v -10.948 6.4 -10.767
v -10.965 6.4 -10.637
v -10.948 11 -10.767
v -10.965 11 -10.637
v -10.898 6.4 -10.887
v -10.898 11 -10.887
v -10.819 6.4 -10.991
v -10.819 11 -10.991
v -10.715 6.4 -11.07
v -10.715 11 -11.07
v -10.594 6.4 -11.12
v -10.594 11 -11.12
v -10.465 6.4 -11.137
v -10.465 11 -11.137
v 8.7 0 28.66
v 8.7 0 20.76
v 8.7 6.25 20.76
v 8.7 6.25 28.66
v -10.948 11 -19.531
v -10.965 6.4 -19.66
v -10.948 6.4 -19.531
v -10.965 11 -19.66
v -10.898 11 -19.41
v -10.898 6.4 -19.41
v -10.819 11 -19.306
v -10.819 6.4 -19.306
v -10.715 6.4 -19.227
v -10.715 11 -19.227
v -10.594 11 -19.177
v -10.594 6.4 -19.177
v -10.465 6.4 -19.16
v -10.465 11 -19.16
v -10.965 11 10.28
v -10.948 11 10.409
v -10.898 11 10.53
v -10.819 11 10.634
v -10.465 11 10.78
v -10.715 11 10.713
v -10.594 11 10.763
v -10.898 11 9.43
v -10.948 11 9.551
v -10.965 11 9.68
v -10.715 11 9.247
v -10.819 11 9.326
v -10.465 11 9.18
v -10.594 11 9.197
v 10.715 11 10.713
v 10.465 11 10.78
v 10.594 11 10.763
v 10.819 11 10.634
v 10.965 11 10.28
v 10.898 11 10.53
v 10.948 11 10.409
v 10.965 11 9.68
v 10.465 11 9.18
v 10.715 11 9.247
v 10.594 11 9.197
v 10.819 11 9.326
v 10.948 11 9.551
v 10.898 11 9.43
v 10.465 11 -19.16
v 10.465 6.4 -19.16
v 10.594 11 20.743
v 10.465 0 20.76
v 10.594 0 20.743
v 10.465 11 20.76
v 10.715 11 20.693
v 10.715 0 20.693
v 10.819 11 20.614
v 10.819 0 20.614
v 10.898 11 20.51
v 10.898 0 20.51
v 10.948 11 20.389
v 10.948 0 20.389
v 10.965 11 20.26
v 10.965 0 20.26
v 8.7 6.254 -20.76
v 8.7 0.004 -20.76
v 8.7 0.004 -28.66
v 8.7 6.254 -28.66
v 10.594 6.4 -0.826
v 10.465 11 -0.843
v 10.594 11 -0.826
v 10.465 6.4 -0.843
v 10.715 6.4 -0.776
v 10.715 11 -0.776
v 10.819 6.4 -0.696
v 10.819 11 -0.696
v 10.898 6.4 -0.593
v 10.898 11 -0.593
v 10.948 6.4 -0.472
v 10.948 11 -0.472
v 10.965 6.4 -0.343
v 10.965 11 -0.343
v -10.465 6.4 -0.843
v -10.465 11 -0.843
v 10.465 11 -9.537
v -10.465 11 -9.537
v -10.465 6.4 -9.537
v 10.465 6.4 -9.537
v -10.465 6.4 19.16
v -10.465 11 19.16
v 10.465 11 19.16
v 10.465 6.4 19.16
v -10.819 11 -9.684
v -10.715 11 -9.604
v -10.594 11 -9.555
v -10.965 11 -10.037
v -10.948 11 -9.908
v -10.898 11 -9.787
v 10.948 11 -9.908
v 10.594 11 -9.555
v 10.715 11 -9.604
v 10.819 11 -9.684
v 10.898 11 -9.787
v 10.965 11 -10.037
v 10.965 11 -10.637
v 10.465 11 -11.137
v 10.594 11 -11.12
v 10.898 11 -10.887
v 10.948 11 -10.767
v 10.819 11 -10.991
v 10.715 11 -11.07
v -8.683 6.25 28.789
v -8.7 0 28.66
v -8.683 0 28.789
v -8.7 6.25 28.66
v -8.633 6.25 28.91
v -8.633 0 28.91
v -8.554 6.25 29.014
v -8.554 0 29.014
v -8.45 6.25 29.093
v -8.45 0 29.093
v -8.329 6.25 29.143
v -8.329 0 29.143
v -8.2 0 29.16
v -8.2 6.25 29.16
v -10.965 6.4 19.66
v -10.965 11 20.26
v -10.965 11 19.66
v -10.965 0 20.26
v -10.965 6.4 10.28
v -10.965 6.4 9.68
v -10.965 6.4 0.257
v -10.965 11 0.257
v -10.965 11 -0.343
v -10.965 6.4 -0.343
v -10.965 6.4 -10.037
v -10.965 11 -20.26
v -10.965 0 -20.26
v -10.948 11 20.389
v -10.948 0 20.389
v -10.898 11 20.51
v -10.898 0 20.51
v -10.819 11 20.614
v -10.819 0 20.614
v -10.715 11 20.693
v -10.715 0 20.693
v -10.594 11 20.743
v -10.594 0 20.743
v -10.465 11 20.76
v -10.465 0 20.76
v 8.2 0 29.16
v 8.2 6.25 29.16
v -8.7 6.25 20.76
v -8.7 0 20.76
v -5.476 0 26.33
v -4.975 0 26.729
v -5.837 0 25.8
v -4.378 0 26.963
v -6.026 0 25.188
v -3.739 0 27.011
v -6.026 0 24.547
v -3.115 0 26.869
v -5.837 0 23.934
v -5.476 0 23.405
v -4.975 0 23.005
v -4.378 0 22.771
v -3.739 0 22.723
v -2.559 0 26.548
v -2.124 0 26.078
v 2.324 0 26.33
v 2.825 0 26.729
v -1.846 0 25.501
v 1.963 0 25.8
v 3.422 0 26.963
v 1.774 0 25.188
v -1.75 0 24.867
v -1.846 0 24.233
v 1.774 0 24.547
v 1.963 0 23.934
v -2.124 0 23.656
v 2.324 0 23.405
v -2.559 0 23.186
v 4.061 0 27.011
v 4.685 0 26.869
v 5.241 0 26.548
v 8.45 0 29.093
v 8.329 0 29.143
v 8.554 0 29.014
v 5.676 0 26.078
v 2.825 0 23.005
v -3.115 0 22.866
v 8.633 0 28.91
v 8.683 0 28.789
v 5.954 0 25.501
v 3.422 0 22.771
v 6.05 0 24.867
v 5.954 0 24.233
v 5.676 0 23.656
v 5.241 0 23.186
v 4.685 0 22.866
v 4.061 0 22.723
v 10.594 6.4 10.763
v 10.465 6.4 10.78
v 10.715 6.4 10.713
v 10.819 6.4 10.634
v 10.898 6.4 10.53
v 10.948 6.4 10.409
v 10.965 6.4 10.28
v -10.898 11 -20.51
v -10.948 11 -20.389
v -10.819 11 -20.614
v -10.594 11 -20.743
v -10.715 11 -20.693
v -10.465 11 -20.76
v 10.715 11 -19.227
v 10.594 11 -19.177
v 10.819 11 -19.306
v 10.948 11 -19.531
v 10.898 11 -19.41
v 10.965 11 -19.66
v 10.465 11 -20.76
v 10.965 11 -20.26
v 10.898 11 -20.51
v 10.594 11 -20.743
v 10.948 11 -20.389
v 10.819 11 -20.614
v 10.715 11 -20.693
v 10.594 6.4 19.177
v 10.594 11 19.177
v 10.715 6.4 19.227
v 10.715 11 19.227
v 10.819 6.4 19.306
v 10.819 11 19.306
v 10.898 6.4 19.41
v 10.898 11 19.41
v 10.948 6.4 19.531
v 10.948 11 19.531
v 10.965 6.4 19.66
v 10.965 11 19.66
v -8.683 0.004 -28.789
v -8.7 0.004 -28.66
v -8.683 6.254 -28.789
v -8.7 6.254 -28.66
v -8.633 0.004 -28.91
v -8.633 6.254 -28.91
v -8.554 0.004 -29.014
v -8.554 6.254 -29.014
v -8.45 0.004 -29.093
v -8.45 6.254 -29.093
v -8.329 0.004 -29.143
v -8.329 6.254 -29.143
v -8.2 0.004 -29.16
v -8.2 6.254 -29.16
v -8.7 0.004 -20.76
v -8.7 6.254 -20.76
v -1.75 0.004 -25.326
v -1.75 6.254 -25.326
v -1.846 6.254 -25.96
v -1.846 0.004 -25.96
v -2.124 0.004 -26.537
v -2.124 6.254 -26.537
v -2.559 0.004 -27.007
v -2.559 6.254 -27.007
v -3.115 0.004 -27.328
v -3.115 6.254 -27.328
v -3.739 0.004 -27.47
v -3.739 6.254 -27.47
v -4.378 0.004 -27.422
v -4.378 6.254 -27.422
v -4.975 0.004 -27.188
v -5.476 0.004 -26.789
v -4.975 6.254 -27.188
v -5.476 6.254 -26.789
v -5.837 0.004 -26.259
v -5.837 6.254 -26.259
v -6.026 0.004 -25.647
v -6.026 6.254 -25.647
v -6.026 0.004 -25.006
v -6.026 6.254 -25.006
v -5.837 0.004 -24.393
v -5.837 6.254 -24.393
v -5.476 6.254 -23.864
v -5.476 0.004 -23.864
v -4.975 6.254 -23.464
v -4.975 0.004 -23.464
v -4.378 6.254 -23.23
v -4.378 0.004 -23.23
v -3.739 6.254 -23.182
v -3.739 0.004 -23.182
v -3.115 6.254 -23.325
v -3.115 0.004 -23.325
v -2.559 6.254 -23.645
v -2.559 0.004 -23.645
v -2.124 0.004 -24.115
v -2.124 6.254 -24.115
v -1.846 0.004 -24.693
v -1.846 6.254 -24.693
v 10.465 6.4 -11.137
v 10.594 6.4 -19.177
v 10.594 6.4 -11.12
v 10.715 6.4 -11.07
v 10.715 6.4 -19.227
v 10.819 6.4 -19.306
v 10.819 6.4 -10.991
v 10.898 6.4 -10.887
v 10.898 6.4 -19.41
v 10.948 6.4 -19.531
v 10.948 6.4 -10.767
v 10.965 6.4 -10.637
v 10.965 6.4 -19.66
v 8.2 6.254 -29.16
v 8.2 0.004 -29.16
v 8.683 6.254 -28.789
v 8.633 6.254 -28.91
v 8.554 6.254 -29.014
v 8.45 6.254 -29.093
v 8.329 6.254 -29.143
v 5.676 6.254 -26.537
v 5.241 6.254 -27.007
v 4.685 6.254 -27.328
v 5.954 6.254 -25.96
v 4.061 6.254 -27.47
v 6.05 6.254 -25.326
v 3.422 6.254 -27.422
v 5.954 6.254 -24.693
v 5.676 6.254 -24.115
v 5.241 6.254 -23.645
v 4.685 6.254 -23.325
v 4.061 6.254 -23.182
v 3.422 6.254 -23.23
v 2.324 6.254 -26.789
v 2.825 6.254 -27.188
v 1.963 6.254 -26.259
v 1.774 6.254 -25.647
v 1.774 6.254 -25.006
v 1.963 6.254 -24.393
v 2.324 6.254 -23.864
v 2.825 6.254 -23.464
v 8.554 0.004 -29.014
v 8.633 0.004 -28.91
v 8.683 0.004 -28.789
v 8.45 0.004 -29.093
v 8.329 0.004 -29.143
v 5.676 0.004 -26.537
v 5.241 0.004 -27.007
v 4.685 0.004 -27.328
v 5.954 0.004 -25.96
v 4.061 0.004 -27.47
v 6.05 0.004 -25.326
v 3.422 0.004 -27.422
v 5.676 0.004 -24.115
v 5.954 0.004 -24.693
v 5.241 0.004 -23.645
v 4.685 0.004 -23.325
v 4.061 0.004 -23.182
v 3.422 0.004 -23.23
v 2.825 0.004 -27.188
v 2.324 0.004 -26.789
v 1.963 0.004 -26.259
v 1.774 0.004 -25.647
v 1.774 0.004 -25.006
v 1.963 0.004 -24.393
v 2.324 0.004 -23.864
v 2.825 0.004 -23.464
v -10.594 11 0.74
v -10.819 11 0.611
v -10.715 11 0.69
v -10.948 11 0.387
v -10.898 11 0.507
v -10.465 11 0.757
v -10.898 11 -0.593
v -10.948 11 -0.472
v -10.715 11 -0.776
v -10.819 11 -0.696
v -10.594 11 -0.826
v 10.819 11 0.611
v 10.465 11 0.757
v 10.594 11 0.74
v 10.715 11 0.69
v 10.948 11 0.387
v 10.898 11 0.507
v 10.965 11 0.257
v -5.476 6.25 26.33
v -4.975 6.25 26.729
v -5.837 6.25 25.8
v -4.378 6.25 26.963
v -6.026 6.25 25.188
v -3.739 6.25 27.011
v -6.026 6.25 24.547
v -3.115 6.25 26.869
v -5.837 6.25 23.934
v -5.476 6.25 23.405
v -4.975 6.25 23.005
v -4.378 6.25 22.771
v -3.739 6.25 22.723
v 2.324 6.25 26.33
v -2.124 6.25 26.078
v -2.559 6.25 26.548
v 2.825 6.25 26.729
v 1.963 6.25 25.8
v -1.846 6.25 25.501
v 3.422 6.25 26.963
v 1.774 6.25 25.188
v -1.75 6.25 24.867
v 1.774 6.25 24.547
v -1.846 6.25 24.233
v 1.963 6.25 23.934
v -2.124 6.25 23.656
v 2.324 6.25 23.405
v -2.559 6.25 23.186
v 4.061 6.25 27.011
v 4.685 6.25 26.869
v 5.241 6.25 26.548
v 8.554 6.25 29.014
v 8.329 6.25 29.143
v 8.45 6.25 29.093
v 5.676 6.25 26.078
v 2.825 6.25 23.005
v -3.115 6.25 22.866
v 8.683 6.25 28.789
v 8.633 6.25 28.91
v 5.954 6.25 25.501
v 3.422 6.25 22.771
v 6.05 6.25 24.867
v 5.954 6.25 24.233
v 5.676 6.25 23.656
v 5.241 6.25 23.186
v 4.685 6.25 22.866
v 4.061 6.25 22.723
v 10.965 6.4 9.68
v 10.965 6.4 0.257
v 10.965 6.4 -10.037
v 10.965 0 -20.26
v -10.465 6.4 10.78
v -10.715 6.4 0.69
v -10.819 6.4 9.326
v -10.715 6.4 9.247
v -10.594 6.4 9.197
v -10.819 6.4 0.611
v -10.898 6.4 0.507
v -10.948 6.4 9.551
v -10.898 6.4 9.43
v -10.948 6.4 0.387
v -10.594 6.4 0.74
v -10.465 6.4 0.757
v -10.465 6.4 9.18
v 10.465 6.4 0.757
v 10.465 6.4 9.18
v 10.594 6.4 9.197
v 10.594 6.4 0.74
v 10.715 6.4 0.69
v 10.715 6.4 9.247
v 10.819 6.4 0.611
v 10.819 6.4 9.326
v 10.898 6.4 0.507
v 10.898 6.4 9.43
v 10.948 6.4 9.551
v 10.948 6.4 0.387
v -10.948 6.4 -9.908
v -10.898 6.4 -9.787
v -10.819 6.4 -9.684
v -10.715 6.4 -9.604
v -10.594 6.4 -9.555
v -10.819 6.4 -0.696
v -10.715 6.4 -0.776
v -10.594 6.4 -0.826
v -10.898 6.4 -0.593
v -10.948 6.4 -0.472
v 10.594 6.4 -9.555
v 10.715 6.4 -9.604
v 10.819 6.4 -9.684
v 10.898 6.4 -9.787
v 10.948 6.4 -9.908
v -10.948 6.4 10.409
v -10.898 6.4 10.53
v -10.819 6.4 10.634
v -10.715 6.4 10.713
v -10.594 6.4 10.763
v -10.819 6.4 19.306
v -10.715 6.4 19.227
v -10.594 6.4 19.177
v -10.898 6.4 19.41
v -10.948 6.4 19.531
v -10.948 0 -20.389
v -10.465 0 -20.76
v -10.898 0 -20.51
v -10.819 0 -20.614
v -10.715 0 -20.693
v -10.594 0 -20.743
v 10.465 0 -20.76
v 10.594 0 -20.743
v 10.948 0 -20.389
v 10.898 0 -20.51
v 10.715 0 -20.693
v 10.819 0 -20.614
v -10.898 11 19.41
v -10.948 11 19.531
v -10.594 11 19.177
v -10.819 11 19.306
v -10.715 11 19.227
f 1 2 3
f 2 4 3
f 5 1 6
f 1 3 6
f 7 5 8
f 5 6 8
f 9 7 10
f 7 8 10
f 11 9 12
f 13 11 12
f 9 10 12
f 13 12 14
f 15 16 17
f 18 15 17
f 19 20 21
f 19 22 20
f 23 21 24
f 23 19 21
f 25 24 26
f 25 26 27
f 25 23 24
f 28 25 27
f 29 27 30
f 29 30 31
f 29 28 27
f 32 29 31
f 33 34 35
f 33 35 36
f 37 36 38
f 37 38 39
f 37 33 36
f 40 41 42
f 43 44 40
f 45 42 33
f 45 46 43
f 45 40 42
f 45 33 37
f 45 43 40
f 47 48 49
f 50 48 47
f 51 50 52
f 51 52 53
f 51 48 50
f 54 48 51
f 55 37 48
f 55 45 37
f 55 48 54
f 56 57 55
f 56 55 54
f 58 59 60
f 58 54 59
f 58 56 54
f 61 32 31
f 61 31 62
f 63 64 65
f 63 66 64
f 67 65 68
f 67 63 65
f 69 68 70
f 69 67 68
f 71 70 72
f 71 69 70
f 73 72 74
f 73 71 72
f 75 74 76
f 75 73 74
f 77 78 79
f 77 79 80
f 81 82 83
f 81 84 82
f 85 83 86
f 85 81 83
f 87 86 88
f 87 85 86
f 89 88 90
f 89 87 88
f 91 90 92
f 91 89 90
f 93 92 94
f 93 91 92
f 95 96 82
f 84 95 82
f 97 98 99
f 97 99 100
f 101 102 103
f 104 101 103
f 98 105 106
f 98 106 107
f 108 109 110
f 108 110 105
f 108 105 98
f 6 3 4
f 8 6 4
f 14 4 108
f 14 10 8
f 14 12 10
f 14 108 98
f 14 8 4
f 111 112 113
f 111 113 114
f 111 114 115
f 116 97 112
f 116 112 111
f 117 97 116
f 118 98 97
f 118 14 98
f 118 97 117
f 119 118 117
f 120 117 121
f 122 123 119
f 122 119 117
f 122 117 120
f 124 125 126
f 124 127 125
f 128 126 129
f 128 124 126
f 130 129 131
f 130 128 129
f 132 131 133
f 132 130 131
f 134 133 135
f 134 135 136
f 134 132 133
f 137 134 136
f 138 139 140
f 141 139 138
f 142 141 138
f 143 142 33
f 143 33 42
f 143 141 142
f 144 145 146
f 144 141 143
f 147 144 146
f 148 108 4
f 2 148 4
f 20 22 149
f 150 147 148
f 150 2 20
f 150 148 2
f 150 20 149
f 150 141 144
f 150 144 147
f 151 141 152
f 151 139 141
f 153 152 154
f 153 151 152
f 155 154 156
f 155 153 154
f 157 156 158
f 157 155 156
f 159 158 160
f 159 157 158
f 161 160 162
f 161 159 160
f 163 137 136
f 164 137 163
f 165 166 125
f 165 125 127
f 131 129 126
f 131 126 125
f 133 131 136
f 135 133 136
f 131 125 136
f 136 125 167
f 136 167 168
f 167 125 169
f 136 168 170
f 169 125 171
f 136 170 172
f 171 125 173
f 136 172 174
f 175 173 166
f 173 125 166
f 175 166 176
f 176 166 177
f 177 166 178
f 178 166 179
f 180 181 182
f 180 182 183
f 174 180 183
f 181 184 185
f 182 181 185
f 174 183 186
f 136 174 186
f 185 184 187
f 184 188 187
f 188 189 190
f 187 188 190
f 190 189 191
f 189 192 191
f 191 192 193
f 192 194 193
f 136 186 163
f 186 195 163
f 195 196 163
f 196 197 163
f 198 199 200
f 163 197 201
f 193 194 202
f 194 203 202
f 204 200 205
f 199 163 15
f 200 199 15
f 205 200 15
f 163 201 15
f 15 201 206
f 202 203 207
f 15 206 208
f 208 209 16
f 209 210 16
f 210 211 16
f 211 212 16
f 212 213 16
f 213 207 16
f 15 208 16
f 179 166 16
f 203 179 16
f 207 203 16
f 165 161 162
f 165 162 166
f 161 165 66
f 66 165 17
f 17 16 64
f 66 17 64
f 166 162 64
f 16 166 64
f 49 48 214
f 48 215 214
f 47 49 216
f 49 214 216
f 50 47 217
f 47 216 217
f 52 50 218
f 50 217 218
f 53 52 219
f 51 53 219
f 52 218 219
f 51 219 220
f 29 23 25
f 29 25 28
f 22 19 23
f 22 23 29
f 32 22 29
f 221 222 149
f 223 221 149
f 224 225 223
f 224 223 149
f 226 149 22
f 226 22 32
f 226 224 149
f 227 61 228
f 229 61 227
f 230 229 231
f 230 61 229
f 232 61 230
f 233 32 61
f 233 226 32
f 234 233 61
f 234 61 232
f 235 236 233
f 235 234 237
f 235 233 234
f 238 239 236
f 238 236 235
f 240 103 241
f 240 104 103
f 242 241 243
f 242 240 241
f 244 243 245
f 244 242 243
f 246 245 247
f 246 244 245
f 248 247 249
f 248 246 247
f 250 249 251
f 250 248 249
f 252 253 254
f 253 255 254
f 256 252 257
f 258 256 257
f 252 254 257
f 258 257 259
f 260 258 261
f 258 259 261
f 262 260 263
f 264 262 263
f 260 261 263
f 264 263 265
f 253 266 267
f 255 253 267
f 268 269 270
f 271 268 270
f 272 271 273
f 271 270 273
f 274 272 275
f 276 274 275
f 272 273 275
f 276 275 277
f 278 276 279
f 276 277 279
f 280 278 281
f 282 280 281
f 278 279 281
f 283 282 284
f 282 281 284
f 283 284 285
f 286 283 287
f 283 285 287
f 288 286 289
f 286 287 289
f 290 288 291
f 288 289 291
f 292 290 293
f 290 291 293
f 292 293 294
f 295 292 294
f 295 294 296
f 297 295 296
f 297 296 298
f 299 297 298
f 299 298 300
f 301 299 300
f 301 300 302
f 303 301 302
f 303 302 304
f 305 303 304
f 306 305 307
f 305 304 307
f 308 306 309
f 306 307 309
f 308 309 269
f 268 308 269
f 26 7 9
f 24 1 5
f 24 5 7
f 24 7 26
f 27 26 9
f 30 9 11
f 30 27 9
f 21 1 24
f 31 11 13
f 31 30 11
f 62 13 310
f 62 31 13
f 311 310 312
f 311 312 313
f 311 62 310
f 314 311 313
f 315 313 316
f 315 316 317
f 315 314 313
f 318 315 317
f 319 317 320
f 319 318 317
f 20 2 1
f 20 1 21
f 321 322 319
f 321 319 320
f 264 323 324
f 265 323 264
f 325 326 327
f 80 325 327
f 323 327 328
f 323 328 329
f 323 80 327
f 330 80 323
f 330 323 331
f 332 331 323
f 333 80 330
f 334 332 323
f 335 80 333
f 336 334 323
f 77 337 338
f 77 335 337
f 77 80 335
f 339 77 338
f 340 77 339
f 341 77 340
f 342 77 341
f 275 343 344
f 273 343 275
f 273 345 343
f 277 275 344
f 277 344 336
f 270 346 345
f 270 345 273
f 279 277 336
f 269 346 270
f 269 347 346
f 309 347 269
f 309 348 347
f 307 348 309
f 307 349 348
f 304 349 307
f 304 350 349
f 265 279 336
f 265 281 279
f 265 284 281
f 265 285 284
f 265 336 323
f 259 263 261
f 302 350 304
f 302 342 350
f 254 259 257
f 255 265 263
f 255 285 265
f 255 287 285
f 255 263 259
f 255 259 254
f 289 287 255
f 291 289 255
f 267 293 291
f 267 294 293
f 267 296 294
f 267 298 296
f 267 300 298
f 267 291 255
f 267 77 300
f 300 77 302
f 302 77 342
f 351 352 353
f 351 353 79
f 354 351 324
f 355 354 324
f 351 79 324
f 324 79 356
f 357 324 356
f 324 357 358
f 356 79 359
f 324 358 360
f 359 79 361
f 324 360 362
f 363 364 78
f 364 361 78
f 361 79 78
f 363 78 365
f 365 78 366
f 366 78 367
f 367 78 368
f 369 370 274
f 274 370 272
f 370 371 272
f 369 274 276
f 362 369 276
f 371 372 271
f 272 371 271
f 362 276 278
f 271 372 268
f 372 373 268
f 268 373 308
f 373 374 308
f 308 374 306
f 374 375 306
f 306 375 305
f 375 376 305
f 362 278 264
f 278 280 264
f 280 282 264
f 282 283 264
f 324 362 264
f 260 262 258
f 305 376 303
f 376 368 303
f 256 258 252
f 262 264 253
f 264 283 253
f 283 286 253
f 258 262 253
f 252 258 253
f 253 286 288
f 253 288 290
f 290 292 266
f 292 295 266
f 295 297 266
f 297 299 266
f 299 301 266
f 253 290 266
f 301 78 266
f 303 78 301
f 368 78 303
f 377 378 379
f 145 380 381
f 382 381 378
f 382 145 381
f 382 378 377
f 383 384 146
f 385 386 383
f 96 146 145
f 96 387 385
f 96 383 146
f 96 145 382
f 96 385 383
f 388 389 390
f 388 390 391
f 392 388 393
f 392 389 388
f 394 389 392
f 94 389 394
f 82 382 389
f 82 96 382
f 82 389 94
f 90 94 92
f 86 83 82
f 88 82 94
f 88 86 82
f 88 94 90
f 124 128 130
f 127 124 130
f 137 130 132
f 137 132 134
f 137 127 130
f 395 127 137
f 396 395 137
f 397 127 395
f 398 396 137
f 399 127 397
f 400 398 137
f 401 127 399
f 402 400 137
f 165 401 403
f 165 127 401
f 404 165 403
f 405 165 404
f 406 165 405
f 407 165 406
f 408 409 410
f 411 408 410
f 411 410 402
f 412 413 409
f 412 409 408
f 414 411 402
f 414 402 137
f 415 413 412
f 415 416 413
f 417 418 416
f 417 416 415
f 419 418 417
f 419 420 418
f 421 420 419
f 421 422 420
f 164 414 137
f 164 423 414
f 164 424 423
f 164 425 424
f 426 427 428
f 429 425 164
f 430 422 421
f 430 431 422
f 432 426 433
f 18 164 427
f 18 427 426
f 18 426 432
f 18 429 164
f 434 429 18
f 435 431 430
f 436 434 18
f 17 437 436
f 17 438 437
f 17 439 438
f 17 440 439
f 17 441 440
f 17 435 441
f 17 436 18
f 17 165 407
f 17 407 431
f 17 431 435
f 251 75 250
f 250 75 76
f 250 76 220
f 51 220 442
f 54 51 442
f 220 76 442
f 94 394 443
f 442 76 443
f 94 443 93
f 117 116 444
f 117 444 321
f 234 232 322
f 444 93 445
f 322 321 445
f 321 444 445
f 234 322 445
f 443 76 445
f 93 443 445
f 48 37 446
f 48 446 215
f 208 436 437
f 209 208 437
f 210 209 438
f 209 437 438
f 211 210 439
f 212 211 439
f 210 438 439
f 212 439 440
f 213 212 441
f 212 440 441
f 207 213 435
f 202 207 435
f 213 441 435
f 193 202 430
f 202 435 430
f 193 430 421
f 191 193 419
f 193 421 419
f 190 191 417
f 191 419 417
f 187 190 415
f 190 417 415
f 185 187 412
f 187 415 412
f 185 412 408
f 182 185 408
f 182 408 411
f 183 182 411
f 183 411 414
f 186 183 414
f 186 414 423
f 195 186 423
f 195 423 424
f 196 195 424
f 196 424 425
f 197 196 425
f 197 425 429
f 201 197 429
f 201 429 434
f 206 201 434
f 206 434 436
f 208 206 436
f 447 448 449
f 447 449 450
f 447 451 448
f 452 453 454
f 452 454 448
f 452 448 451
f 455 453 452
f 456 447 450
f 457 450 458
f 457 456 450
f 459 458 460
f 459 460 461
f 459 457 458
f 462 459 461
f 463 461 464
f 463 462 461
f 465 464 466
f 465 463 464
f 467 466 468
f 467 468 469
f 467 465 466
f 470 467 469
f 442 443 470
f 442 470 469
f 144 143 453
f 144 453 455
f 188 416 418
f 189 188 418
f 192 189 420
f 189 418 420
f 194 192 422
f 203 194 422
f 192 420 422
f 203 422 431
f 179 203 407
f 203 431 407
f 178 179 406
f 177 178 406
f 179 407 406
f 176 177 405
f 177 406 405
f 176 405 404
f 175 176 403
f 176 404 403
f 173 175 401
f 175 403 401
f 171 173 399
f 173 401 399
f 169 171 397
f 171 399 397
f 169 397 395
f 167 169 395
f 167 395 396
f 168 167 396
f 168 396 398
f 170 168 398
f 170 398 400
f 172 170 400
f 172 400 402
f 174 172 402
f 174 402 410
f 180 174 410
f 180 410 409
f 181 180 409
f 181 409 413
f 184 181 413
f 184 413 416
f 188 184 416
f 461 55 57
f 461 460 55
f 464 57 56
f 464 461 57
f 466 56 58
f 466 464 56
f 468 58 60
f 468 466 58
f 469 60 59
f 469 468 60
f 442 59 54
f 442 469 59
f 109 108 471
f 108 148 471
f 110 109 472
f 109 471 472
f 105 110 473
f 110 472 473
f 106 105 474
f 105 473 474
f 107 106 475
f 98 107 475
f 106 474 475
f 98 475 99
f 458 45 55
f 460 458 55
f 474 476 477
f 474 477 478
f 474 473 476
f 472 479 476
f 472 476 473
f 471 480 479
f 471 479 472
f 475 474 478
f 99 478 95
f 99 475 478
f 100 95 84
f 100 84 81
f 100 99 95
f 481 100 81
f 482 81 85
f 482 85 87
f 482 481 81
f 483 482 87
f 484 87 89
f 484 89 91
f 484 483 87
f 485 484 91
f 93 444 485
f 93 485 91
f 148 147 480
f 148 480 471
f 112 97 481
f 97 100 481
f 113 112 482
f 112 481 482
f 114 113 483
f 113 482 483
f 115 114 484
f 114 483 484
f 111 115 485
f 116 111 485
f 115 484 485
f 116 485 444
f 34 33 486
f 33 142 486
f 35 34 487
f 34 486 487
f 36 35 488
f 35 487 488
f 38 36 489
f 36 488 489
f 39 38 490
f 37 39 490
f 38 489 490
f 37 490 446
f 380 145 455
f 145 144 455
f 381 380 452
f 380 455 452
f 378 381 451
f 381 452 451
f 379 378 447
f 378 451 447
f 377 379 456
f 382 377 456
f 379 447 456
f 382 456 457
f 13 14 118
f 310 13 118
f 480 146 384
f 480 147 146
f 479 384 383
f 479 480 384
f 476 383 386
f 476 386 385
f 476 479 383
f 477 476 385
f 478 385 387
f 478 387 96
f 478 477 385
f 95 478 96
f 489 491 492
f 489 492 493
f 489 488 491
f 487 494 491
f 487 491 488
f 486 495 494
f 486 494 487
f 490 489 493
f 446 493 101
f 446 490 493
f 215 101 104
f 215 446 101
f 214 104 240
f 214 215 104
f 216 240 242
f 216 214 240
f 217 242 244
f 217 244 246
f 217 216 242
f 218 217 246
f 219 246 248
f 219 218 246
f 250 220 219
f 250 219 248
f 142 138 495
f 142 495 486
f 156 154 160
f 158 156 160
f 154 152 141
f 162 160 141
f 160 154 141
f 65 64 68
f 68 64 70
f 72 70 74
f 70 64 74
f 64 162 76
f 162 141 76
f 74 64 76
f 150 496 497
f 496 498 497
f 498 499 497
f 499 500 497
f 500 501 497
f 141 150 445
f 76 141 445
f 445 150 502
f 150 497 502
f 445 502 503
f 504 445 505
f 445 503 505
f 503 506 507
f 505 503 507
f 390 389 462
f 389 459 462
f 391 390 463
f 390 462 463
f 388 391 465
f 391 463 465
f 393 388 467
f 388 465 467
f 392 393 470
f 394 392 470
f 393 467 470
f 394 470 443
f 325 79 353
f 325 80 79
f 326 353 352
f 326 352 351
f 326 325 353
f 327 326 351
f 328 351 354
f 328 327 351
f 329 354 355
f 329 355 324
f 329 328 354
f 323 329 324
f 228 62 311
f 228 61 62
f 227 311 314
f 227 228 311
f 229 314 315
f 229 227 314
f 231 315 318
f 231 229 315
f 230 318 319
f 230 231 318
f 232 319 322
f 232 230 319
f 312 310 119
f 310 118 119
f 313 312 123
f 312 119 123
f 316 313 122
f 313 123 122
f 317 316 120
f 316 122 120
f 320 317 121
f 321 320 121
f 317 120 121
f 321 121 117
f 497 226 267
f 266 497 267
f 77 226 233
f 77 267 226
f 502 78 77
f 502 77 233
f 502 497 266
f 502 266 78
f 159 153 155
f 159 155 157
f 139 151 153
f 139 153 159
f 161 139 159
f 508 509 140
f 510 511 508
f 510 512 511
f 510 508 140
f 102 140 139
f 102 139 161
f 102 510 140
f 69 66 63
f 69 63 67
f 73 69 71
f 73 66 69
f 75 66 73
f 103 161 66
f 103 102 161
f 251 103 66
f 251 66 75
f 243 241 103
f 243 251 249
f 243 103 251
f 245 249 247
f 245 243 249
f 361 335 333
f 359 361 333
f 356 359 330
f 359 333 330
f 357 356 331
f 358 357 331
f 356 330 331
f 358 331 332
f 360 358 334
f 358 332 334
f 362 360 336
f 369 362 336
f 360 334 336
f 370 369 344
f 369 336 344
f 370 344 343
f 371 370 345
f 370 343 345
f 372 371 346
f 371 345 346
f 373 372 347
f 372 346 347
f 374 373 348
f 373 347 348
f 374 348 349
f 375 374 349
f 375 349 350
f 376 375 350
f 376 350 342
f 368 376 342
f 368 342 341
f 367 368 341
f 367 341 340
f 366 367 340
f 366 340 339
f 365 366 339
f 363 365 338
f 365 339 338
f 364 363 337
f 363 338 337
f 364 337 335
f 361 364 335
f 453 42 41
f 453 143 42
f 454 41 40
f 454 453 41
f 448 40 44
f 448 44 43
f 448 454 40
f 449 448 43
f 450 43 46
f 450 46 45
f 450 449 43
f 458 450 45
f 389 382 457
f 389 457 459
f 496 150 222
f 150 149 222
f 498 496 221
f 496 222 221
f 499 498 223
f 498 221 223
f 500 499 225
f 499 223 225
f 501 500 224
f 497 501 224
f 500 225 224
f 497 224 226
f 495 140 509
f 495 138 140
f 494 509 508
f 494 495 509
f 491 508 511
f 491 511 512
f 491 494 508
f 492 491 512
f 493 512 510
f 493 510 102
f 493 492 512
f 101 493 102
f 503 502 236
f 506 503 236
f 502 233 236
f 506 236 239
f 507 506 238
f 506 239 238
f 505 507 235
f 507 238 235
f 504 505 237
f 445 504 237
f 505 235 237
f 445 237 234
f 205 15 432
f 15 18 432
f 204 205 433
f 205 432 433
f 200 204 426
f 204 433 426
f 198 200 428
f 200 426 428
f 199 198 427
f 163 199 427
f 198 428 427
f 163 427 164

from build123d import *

# Parameters (mm, degrees)
SKETCH1_W           = 21.93
SKETCH1_H           = 41.52
BOSS_EXTRUDE2_DEPTH = 11
SKETCH3_W           = 21.93
SKETCH3_H           = 8.38
SKETCH3_H_2         = 8.42274565
SKETCH3_H_3         = 8.694734819
SKETCH3_W_2         = 22
SKETCH3_H_4         = 8.022519531
CUT_EXTRUDE2_DEPTH  = 4.6
BOSS_EXTRUDE3_START = 20.76
SKETCH5_W           = 17.4
SKETCH5_H           = 6.25
BOSS_EXTRUDE3_DEPTH = 8.4
SKETCH6_R           = 2.15
CUT_EXTRUDE3_DEPTH  = 8.4
SKETCH7_W           = 17.4
SKETCH7_H           = 6.25
BOSS_EXTRUDE4_DEPTH = 8.4
SKETCH9_R           = 2.15
CUT_EXTRUDE4_DEPTH  = 6.25
FILLET2_R           = 0.5


with BuildPart() as part:
    # Sketch1 → Boss-Extrude2 (new body)
    with BuildSketch(Plane(origin=(0, 0, 0), x_dir=(1, 0, 0), z_dir=(0, 1, 0))):
        Rectangle(SKETCH1_W, SKETCH1_H)
    extrude(amount=BOSS_EXTRUDE2_DEPTH)

    # Sketch3 → Cut-Extrude2 (cut)
    with BuildSketch(Plane(origin=(0, 11, 0), x_dir=(1, 0, 0), z_dir=(0, 1, 0))):
        with Locations((0, -14.97)):
            Rectangle(SKETCH3_W, SKETCH3_H)
        with Locations((0, -4.968627175)):
            Rectangle(SKETCH3_W, SKETCH3_H_2)
        with Locations((0, 5.190113059)):
            Rectangle(SKETCH3_W, SKETCH3_H_3)
        with Locations((0.013958332, 15.148740234)):
            Rectangle(SKETCH3_W_2, SKETCH3_H_4)
    extrude(amount=-CUT_EXTRUDE2_DEPTH, mode=Mode.SUBTRACT)

    # Sketch5 → Boss-Extrude3 (add)
    with BuildSketch(Plane.XY.offset(BOSS_EXTRUDE3_START)):
        with Locations((0, 3.125184184)):
            Rectangle(SKETCH5_W, SKETCH5_H)
    extrude(amount=BOSS_EXTRUDE3_DEPTH)

    # Sketch6 → Cut-Extrude3 (cut)
    with BuildSketch(Plane(origin=(0, 6.250184184, 0), x_dir=(1, 0, 0), z_dir=(0, 1, 0))):
        with Locations((-3.9, -24.867133618)):
            Circle(SKETCH6_R)
        with Locations((3.9, -24.867133618)):
            Circle(SKETCH6_R)
    extrude(amount=-CUT_EXTRUDE3_DEPTH, mode=Mode.SUBTRACT)

    # Sketch7 → Boss-Extrude4 (add)
    with BuildSketch(Plane(origin=(0, 0, -20.76), x_dir=(-1, 0, 0), z_dir=(0, 0, -1))):
        with Locations((0, 3.128849309)):
            Rectangle(SKETCH7_W, SKETCH7_H)
    extrude(amount=BOSS_EXTRUDE4_DEPTH)

    # Sketch9 → Cut-Extrude4 (cut)
    with BuildSketch(Plane(origin=(0, 6.253849309, 0), x_dir=(1, 0, 0), z_dir=(0, 1, 0))):
        with Locations((-3.9, 25.32626204)):
            Circle(SKETCH9_R)
        with Locations((3.9, 25.32626204)):
            Circle(SKETCH9_R)
    extrude(amount=-CUT_EXTRUDE4_DEPTH, mode=Mode.SUBTRACT)

    # Fillet2
    fillet2_edges = [part.edges().sort_by_distance(p)[0] for p in [
        (8.7, 3.128849309, -29.16),
        (-8.7, 3.128849309, -29.16),
        (-10.965, 8.7, 19.16),
        (-10.965, 8.7, 10.78),
        (10.965, 8.7, 10.78),
        (10.965, 8.7, 19.16),
        (-10.965, 8.7, 9.18),
        (-10.965, 8.7, 0.75725435),
        (10.965, 8.7, 0.75725435),
        (10.965, 8.7, 9.18),
        (-10.965, 8.7, -0.84274565),
        (-10.965, 8.7, -9.537480469),
        (10.965, 8.7, -9.537480469),
        (10.965, 8.7, -0.84274565),
        (10.965, 8.7, -19.16),
        (-10.965, 8.7, -19.16),
        (10.965, 8.7, -11.137480469),
        (-10.965, 8.7, -11.137480469),
        (10.965, 5.5, 20.76),
        (10.965, 5.5, -20.76),
        (-10.965, 5.5, -20.76),
        (-10.965, 5.5, 20.76),
        (-8.7, 3.125184184, 29.16),
        (8.7, 3.125184184, 29.16),
    ]]
    fillet(fillet2_edges, radius=FILLET2_R)


solid = part.part
